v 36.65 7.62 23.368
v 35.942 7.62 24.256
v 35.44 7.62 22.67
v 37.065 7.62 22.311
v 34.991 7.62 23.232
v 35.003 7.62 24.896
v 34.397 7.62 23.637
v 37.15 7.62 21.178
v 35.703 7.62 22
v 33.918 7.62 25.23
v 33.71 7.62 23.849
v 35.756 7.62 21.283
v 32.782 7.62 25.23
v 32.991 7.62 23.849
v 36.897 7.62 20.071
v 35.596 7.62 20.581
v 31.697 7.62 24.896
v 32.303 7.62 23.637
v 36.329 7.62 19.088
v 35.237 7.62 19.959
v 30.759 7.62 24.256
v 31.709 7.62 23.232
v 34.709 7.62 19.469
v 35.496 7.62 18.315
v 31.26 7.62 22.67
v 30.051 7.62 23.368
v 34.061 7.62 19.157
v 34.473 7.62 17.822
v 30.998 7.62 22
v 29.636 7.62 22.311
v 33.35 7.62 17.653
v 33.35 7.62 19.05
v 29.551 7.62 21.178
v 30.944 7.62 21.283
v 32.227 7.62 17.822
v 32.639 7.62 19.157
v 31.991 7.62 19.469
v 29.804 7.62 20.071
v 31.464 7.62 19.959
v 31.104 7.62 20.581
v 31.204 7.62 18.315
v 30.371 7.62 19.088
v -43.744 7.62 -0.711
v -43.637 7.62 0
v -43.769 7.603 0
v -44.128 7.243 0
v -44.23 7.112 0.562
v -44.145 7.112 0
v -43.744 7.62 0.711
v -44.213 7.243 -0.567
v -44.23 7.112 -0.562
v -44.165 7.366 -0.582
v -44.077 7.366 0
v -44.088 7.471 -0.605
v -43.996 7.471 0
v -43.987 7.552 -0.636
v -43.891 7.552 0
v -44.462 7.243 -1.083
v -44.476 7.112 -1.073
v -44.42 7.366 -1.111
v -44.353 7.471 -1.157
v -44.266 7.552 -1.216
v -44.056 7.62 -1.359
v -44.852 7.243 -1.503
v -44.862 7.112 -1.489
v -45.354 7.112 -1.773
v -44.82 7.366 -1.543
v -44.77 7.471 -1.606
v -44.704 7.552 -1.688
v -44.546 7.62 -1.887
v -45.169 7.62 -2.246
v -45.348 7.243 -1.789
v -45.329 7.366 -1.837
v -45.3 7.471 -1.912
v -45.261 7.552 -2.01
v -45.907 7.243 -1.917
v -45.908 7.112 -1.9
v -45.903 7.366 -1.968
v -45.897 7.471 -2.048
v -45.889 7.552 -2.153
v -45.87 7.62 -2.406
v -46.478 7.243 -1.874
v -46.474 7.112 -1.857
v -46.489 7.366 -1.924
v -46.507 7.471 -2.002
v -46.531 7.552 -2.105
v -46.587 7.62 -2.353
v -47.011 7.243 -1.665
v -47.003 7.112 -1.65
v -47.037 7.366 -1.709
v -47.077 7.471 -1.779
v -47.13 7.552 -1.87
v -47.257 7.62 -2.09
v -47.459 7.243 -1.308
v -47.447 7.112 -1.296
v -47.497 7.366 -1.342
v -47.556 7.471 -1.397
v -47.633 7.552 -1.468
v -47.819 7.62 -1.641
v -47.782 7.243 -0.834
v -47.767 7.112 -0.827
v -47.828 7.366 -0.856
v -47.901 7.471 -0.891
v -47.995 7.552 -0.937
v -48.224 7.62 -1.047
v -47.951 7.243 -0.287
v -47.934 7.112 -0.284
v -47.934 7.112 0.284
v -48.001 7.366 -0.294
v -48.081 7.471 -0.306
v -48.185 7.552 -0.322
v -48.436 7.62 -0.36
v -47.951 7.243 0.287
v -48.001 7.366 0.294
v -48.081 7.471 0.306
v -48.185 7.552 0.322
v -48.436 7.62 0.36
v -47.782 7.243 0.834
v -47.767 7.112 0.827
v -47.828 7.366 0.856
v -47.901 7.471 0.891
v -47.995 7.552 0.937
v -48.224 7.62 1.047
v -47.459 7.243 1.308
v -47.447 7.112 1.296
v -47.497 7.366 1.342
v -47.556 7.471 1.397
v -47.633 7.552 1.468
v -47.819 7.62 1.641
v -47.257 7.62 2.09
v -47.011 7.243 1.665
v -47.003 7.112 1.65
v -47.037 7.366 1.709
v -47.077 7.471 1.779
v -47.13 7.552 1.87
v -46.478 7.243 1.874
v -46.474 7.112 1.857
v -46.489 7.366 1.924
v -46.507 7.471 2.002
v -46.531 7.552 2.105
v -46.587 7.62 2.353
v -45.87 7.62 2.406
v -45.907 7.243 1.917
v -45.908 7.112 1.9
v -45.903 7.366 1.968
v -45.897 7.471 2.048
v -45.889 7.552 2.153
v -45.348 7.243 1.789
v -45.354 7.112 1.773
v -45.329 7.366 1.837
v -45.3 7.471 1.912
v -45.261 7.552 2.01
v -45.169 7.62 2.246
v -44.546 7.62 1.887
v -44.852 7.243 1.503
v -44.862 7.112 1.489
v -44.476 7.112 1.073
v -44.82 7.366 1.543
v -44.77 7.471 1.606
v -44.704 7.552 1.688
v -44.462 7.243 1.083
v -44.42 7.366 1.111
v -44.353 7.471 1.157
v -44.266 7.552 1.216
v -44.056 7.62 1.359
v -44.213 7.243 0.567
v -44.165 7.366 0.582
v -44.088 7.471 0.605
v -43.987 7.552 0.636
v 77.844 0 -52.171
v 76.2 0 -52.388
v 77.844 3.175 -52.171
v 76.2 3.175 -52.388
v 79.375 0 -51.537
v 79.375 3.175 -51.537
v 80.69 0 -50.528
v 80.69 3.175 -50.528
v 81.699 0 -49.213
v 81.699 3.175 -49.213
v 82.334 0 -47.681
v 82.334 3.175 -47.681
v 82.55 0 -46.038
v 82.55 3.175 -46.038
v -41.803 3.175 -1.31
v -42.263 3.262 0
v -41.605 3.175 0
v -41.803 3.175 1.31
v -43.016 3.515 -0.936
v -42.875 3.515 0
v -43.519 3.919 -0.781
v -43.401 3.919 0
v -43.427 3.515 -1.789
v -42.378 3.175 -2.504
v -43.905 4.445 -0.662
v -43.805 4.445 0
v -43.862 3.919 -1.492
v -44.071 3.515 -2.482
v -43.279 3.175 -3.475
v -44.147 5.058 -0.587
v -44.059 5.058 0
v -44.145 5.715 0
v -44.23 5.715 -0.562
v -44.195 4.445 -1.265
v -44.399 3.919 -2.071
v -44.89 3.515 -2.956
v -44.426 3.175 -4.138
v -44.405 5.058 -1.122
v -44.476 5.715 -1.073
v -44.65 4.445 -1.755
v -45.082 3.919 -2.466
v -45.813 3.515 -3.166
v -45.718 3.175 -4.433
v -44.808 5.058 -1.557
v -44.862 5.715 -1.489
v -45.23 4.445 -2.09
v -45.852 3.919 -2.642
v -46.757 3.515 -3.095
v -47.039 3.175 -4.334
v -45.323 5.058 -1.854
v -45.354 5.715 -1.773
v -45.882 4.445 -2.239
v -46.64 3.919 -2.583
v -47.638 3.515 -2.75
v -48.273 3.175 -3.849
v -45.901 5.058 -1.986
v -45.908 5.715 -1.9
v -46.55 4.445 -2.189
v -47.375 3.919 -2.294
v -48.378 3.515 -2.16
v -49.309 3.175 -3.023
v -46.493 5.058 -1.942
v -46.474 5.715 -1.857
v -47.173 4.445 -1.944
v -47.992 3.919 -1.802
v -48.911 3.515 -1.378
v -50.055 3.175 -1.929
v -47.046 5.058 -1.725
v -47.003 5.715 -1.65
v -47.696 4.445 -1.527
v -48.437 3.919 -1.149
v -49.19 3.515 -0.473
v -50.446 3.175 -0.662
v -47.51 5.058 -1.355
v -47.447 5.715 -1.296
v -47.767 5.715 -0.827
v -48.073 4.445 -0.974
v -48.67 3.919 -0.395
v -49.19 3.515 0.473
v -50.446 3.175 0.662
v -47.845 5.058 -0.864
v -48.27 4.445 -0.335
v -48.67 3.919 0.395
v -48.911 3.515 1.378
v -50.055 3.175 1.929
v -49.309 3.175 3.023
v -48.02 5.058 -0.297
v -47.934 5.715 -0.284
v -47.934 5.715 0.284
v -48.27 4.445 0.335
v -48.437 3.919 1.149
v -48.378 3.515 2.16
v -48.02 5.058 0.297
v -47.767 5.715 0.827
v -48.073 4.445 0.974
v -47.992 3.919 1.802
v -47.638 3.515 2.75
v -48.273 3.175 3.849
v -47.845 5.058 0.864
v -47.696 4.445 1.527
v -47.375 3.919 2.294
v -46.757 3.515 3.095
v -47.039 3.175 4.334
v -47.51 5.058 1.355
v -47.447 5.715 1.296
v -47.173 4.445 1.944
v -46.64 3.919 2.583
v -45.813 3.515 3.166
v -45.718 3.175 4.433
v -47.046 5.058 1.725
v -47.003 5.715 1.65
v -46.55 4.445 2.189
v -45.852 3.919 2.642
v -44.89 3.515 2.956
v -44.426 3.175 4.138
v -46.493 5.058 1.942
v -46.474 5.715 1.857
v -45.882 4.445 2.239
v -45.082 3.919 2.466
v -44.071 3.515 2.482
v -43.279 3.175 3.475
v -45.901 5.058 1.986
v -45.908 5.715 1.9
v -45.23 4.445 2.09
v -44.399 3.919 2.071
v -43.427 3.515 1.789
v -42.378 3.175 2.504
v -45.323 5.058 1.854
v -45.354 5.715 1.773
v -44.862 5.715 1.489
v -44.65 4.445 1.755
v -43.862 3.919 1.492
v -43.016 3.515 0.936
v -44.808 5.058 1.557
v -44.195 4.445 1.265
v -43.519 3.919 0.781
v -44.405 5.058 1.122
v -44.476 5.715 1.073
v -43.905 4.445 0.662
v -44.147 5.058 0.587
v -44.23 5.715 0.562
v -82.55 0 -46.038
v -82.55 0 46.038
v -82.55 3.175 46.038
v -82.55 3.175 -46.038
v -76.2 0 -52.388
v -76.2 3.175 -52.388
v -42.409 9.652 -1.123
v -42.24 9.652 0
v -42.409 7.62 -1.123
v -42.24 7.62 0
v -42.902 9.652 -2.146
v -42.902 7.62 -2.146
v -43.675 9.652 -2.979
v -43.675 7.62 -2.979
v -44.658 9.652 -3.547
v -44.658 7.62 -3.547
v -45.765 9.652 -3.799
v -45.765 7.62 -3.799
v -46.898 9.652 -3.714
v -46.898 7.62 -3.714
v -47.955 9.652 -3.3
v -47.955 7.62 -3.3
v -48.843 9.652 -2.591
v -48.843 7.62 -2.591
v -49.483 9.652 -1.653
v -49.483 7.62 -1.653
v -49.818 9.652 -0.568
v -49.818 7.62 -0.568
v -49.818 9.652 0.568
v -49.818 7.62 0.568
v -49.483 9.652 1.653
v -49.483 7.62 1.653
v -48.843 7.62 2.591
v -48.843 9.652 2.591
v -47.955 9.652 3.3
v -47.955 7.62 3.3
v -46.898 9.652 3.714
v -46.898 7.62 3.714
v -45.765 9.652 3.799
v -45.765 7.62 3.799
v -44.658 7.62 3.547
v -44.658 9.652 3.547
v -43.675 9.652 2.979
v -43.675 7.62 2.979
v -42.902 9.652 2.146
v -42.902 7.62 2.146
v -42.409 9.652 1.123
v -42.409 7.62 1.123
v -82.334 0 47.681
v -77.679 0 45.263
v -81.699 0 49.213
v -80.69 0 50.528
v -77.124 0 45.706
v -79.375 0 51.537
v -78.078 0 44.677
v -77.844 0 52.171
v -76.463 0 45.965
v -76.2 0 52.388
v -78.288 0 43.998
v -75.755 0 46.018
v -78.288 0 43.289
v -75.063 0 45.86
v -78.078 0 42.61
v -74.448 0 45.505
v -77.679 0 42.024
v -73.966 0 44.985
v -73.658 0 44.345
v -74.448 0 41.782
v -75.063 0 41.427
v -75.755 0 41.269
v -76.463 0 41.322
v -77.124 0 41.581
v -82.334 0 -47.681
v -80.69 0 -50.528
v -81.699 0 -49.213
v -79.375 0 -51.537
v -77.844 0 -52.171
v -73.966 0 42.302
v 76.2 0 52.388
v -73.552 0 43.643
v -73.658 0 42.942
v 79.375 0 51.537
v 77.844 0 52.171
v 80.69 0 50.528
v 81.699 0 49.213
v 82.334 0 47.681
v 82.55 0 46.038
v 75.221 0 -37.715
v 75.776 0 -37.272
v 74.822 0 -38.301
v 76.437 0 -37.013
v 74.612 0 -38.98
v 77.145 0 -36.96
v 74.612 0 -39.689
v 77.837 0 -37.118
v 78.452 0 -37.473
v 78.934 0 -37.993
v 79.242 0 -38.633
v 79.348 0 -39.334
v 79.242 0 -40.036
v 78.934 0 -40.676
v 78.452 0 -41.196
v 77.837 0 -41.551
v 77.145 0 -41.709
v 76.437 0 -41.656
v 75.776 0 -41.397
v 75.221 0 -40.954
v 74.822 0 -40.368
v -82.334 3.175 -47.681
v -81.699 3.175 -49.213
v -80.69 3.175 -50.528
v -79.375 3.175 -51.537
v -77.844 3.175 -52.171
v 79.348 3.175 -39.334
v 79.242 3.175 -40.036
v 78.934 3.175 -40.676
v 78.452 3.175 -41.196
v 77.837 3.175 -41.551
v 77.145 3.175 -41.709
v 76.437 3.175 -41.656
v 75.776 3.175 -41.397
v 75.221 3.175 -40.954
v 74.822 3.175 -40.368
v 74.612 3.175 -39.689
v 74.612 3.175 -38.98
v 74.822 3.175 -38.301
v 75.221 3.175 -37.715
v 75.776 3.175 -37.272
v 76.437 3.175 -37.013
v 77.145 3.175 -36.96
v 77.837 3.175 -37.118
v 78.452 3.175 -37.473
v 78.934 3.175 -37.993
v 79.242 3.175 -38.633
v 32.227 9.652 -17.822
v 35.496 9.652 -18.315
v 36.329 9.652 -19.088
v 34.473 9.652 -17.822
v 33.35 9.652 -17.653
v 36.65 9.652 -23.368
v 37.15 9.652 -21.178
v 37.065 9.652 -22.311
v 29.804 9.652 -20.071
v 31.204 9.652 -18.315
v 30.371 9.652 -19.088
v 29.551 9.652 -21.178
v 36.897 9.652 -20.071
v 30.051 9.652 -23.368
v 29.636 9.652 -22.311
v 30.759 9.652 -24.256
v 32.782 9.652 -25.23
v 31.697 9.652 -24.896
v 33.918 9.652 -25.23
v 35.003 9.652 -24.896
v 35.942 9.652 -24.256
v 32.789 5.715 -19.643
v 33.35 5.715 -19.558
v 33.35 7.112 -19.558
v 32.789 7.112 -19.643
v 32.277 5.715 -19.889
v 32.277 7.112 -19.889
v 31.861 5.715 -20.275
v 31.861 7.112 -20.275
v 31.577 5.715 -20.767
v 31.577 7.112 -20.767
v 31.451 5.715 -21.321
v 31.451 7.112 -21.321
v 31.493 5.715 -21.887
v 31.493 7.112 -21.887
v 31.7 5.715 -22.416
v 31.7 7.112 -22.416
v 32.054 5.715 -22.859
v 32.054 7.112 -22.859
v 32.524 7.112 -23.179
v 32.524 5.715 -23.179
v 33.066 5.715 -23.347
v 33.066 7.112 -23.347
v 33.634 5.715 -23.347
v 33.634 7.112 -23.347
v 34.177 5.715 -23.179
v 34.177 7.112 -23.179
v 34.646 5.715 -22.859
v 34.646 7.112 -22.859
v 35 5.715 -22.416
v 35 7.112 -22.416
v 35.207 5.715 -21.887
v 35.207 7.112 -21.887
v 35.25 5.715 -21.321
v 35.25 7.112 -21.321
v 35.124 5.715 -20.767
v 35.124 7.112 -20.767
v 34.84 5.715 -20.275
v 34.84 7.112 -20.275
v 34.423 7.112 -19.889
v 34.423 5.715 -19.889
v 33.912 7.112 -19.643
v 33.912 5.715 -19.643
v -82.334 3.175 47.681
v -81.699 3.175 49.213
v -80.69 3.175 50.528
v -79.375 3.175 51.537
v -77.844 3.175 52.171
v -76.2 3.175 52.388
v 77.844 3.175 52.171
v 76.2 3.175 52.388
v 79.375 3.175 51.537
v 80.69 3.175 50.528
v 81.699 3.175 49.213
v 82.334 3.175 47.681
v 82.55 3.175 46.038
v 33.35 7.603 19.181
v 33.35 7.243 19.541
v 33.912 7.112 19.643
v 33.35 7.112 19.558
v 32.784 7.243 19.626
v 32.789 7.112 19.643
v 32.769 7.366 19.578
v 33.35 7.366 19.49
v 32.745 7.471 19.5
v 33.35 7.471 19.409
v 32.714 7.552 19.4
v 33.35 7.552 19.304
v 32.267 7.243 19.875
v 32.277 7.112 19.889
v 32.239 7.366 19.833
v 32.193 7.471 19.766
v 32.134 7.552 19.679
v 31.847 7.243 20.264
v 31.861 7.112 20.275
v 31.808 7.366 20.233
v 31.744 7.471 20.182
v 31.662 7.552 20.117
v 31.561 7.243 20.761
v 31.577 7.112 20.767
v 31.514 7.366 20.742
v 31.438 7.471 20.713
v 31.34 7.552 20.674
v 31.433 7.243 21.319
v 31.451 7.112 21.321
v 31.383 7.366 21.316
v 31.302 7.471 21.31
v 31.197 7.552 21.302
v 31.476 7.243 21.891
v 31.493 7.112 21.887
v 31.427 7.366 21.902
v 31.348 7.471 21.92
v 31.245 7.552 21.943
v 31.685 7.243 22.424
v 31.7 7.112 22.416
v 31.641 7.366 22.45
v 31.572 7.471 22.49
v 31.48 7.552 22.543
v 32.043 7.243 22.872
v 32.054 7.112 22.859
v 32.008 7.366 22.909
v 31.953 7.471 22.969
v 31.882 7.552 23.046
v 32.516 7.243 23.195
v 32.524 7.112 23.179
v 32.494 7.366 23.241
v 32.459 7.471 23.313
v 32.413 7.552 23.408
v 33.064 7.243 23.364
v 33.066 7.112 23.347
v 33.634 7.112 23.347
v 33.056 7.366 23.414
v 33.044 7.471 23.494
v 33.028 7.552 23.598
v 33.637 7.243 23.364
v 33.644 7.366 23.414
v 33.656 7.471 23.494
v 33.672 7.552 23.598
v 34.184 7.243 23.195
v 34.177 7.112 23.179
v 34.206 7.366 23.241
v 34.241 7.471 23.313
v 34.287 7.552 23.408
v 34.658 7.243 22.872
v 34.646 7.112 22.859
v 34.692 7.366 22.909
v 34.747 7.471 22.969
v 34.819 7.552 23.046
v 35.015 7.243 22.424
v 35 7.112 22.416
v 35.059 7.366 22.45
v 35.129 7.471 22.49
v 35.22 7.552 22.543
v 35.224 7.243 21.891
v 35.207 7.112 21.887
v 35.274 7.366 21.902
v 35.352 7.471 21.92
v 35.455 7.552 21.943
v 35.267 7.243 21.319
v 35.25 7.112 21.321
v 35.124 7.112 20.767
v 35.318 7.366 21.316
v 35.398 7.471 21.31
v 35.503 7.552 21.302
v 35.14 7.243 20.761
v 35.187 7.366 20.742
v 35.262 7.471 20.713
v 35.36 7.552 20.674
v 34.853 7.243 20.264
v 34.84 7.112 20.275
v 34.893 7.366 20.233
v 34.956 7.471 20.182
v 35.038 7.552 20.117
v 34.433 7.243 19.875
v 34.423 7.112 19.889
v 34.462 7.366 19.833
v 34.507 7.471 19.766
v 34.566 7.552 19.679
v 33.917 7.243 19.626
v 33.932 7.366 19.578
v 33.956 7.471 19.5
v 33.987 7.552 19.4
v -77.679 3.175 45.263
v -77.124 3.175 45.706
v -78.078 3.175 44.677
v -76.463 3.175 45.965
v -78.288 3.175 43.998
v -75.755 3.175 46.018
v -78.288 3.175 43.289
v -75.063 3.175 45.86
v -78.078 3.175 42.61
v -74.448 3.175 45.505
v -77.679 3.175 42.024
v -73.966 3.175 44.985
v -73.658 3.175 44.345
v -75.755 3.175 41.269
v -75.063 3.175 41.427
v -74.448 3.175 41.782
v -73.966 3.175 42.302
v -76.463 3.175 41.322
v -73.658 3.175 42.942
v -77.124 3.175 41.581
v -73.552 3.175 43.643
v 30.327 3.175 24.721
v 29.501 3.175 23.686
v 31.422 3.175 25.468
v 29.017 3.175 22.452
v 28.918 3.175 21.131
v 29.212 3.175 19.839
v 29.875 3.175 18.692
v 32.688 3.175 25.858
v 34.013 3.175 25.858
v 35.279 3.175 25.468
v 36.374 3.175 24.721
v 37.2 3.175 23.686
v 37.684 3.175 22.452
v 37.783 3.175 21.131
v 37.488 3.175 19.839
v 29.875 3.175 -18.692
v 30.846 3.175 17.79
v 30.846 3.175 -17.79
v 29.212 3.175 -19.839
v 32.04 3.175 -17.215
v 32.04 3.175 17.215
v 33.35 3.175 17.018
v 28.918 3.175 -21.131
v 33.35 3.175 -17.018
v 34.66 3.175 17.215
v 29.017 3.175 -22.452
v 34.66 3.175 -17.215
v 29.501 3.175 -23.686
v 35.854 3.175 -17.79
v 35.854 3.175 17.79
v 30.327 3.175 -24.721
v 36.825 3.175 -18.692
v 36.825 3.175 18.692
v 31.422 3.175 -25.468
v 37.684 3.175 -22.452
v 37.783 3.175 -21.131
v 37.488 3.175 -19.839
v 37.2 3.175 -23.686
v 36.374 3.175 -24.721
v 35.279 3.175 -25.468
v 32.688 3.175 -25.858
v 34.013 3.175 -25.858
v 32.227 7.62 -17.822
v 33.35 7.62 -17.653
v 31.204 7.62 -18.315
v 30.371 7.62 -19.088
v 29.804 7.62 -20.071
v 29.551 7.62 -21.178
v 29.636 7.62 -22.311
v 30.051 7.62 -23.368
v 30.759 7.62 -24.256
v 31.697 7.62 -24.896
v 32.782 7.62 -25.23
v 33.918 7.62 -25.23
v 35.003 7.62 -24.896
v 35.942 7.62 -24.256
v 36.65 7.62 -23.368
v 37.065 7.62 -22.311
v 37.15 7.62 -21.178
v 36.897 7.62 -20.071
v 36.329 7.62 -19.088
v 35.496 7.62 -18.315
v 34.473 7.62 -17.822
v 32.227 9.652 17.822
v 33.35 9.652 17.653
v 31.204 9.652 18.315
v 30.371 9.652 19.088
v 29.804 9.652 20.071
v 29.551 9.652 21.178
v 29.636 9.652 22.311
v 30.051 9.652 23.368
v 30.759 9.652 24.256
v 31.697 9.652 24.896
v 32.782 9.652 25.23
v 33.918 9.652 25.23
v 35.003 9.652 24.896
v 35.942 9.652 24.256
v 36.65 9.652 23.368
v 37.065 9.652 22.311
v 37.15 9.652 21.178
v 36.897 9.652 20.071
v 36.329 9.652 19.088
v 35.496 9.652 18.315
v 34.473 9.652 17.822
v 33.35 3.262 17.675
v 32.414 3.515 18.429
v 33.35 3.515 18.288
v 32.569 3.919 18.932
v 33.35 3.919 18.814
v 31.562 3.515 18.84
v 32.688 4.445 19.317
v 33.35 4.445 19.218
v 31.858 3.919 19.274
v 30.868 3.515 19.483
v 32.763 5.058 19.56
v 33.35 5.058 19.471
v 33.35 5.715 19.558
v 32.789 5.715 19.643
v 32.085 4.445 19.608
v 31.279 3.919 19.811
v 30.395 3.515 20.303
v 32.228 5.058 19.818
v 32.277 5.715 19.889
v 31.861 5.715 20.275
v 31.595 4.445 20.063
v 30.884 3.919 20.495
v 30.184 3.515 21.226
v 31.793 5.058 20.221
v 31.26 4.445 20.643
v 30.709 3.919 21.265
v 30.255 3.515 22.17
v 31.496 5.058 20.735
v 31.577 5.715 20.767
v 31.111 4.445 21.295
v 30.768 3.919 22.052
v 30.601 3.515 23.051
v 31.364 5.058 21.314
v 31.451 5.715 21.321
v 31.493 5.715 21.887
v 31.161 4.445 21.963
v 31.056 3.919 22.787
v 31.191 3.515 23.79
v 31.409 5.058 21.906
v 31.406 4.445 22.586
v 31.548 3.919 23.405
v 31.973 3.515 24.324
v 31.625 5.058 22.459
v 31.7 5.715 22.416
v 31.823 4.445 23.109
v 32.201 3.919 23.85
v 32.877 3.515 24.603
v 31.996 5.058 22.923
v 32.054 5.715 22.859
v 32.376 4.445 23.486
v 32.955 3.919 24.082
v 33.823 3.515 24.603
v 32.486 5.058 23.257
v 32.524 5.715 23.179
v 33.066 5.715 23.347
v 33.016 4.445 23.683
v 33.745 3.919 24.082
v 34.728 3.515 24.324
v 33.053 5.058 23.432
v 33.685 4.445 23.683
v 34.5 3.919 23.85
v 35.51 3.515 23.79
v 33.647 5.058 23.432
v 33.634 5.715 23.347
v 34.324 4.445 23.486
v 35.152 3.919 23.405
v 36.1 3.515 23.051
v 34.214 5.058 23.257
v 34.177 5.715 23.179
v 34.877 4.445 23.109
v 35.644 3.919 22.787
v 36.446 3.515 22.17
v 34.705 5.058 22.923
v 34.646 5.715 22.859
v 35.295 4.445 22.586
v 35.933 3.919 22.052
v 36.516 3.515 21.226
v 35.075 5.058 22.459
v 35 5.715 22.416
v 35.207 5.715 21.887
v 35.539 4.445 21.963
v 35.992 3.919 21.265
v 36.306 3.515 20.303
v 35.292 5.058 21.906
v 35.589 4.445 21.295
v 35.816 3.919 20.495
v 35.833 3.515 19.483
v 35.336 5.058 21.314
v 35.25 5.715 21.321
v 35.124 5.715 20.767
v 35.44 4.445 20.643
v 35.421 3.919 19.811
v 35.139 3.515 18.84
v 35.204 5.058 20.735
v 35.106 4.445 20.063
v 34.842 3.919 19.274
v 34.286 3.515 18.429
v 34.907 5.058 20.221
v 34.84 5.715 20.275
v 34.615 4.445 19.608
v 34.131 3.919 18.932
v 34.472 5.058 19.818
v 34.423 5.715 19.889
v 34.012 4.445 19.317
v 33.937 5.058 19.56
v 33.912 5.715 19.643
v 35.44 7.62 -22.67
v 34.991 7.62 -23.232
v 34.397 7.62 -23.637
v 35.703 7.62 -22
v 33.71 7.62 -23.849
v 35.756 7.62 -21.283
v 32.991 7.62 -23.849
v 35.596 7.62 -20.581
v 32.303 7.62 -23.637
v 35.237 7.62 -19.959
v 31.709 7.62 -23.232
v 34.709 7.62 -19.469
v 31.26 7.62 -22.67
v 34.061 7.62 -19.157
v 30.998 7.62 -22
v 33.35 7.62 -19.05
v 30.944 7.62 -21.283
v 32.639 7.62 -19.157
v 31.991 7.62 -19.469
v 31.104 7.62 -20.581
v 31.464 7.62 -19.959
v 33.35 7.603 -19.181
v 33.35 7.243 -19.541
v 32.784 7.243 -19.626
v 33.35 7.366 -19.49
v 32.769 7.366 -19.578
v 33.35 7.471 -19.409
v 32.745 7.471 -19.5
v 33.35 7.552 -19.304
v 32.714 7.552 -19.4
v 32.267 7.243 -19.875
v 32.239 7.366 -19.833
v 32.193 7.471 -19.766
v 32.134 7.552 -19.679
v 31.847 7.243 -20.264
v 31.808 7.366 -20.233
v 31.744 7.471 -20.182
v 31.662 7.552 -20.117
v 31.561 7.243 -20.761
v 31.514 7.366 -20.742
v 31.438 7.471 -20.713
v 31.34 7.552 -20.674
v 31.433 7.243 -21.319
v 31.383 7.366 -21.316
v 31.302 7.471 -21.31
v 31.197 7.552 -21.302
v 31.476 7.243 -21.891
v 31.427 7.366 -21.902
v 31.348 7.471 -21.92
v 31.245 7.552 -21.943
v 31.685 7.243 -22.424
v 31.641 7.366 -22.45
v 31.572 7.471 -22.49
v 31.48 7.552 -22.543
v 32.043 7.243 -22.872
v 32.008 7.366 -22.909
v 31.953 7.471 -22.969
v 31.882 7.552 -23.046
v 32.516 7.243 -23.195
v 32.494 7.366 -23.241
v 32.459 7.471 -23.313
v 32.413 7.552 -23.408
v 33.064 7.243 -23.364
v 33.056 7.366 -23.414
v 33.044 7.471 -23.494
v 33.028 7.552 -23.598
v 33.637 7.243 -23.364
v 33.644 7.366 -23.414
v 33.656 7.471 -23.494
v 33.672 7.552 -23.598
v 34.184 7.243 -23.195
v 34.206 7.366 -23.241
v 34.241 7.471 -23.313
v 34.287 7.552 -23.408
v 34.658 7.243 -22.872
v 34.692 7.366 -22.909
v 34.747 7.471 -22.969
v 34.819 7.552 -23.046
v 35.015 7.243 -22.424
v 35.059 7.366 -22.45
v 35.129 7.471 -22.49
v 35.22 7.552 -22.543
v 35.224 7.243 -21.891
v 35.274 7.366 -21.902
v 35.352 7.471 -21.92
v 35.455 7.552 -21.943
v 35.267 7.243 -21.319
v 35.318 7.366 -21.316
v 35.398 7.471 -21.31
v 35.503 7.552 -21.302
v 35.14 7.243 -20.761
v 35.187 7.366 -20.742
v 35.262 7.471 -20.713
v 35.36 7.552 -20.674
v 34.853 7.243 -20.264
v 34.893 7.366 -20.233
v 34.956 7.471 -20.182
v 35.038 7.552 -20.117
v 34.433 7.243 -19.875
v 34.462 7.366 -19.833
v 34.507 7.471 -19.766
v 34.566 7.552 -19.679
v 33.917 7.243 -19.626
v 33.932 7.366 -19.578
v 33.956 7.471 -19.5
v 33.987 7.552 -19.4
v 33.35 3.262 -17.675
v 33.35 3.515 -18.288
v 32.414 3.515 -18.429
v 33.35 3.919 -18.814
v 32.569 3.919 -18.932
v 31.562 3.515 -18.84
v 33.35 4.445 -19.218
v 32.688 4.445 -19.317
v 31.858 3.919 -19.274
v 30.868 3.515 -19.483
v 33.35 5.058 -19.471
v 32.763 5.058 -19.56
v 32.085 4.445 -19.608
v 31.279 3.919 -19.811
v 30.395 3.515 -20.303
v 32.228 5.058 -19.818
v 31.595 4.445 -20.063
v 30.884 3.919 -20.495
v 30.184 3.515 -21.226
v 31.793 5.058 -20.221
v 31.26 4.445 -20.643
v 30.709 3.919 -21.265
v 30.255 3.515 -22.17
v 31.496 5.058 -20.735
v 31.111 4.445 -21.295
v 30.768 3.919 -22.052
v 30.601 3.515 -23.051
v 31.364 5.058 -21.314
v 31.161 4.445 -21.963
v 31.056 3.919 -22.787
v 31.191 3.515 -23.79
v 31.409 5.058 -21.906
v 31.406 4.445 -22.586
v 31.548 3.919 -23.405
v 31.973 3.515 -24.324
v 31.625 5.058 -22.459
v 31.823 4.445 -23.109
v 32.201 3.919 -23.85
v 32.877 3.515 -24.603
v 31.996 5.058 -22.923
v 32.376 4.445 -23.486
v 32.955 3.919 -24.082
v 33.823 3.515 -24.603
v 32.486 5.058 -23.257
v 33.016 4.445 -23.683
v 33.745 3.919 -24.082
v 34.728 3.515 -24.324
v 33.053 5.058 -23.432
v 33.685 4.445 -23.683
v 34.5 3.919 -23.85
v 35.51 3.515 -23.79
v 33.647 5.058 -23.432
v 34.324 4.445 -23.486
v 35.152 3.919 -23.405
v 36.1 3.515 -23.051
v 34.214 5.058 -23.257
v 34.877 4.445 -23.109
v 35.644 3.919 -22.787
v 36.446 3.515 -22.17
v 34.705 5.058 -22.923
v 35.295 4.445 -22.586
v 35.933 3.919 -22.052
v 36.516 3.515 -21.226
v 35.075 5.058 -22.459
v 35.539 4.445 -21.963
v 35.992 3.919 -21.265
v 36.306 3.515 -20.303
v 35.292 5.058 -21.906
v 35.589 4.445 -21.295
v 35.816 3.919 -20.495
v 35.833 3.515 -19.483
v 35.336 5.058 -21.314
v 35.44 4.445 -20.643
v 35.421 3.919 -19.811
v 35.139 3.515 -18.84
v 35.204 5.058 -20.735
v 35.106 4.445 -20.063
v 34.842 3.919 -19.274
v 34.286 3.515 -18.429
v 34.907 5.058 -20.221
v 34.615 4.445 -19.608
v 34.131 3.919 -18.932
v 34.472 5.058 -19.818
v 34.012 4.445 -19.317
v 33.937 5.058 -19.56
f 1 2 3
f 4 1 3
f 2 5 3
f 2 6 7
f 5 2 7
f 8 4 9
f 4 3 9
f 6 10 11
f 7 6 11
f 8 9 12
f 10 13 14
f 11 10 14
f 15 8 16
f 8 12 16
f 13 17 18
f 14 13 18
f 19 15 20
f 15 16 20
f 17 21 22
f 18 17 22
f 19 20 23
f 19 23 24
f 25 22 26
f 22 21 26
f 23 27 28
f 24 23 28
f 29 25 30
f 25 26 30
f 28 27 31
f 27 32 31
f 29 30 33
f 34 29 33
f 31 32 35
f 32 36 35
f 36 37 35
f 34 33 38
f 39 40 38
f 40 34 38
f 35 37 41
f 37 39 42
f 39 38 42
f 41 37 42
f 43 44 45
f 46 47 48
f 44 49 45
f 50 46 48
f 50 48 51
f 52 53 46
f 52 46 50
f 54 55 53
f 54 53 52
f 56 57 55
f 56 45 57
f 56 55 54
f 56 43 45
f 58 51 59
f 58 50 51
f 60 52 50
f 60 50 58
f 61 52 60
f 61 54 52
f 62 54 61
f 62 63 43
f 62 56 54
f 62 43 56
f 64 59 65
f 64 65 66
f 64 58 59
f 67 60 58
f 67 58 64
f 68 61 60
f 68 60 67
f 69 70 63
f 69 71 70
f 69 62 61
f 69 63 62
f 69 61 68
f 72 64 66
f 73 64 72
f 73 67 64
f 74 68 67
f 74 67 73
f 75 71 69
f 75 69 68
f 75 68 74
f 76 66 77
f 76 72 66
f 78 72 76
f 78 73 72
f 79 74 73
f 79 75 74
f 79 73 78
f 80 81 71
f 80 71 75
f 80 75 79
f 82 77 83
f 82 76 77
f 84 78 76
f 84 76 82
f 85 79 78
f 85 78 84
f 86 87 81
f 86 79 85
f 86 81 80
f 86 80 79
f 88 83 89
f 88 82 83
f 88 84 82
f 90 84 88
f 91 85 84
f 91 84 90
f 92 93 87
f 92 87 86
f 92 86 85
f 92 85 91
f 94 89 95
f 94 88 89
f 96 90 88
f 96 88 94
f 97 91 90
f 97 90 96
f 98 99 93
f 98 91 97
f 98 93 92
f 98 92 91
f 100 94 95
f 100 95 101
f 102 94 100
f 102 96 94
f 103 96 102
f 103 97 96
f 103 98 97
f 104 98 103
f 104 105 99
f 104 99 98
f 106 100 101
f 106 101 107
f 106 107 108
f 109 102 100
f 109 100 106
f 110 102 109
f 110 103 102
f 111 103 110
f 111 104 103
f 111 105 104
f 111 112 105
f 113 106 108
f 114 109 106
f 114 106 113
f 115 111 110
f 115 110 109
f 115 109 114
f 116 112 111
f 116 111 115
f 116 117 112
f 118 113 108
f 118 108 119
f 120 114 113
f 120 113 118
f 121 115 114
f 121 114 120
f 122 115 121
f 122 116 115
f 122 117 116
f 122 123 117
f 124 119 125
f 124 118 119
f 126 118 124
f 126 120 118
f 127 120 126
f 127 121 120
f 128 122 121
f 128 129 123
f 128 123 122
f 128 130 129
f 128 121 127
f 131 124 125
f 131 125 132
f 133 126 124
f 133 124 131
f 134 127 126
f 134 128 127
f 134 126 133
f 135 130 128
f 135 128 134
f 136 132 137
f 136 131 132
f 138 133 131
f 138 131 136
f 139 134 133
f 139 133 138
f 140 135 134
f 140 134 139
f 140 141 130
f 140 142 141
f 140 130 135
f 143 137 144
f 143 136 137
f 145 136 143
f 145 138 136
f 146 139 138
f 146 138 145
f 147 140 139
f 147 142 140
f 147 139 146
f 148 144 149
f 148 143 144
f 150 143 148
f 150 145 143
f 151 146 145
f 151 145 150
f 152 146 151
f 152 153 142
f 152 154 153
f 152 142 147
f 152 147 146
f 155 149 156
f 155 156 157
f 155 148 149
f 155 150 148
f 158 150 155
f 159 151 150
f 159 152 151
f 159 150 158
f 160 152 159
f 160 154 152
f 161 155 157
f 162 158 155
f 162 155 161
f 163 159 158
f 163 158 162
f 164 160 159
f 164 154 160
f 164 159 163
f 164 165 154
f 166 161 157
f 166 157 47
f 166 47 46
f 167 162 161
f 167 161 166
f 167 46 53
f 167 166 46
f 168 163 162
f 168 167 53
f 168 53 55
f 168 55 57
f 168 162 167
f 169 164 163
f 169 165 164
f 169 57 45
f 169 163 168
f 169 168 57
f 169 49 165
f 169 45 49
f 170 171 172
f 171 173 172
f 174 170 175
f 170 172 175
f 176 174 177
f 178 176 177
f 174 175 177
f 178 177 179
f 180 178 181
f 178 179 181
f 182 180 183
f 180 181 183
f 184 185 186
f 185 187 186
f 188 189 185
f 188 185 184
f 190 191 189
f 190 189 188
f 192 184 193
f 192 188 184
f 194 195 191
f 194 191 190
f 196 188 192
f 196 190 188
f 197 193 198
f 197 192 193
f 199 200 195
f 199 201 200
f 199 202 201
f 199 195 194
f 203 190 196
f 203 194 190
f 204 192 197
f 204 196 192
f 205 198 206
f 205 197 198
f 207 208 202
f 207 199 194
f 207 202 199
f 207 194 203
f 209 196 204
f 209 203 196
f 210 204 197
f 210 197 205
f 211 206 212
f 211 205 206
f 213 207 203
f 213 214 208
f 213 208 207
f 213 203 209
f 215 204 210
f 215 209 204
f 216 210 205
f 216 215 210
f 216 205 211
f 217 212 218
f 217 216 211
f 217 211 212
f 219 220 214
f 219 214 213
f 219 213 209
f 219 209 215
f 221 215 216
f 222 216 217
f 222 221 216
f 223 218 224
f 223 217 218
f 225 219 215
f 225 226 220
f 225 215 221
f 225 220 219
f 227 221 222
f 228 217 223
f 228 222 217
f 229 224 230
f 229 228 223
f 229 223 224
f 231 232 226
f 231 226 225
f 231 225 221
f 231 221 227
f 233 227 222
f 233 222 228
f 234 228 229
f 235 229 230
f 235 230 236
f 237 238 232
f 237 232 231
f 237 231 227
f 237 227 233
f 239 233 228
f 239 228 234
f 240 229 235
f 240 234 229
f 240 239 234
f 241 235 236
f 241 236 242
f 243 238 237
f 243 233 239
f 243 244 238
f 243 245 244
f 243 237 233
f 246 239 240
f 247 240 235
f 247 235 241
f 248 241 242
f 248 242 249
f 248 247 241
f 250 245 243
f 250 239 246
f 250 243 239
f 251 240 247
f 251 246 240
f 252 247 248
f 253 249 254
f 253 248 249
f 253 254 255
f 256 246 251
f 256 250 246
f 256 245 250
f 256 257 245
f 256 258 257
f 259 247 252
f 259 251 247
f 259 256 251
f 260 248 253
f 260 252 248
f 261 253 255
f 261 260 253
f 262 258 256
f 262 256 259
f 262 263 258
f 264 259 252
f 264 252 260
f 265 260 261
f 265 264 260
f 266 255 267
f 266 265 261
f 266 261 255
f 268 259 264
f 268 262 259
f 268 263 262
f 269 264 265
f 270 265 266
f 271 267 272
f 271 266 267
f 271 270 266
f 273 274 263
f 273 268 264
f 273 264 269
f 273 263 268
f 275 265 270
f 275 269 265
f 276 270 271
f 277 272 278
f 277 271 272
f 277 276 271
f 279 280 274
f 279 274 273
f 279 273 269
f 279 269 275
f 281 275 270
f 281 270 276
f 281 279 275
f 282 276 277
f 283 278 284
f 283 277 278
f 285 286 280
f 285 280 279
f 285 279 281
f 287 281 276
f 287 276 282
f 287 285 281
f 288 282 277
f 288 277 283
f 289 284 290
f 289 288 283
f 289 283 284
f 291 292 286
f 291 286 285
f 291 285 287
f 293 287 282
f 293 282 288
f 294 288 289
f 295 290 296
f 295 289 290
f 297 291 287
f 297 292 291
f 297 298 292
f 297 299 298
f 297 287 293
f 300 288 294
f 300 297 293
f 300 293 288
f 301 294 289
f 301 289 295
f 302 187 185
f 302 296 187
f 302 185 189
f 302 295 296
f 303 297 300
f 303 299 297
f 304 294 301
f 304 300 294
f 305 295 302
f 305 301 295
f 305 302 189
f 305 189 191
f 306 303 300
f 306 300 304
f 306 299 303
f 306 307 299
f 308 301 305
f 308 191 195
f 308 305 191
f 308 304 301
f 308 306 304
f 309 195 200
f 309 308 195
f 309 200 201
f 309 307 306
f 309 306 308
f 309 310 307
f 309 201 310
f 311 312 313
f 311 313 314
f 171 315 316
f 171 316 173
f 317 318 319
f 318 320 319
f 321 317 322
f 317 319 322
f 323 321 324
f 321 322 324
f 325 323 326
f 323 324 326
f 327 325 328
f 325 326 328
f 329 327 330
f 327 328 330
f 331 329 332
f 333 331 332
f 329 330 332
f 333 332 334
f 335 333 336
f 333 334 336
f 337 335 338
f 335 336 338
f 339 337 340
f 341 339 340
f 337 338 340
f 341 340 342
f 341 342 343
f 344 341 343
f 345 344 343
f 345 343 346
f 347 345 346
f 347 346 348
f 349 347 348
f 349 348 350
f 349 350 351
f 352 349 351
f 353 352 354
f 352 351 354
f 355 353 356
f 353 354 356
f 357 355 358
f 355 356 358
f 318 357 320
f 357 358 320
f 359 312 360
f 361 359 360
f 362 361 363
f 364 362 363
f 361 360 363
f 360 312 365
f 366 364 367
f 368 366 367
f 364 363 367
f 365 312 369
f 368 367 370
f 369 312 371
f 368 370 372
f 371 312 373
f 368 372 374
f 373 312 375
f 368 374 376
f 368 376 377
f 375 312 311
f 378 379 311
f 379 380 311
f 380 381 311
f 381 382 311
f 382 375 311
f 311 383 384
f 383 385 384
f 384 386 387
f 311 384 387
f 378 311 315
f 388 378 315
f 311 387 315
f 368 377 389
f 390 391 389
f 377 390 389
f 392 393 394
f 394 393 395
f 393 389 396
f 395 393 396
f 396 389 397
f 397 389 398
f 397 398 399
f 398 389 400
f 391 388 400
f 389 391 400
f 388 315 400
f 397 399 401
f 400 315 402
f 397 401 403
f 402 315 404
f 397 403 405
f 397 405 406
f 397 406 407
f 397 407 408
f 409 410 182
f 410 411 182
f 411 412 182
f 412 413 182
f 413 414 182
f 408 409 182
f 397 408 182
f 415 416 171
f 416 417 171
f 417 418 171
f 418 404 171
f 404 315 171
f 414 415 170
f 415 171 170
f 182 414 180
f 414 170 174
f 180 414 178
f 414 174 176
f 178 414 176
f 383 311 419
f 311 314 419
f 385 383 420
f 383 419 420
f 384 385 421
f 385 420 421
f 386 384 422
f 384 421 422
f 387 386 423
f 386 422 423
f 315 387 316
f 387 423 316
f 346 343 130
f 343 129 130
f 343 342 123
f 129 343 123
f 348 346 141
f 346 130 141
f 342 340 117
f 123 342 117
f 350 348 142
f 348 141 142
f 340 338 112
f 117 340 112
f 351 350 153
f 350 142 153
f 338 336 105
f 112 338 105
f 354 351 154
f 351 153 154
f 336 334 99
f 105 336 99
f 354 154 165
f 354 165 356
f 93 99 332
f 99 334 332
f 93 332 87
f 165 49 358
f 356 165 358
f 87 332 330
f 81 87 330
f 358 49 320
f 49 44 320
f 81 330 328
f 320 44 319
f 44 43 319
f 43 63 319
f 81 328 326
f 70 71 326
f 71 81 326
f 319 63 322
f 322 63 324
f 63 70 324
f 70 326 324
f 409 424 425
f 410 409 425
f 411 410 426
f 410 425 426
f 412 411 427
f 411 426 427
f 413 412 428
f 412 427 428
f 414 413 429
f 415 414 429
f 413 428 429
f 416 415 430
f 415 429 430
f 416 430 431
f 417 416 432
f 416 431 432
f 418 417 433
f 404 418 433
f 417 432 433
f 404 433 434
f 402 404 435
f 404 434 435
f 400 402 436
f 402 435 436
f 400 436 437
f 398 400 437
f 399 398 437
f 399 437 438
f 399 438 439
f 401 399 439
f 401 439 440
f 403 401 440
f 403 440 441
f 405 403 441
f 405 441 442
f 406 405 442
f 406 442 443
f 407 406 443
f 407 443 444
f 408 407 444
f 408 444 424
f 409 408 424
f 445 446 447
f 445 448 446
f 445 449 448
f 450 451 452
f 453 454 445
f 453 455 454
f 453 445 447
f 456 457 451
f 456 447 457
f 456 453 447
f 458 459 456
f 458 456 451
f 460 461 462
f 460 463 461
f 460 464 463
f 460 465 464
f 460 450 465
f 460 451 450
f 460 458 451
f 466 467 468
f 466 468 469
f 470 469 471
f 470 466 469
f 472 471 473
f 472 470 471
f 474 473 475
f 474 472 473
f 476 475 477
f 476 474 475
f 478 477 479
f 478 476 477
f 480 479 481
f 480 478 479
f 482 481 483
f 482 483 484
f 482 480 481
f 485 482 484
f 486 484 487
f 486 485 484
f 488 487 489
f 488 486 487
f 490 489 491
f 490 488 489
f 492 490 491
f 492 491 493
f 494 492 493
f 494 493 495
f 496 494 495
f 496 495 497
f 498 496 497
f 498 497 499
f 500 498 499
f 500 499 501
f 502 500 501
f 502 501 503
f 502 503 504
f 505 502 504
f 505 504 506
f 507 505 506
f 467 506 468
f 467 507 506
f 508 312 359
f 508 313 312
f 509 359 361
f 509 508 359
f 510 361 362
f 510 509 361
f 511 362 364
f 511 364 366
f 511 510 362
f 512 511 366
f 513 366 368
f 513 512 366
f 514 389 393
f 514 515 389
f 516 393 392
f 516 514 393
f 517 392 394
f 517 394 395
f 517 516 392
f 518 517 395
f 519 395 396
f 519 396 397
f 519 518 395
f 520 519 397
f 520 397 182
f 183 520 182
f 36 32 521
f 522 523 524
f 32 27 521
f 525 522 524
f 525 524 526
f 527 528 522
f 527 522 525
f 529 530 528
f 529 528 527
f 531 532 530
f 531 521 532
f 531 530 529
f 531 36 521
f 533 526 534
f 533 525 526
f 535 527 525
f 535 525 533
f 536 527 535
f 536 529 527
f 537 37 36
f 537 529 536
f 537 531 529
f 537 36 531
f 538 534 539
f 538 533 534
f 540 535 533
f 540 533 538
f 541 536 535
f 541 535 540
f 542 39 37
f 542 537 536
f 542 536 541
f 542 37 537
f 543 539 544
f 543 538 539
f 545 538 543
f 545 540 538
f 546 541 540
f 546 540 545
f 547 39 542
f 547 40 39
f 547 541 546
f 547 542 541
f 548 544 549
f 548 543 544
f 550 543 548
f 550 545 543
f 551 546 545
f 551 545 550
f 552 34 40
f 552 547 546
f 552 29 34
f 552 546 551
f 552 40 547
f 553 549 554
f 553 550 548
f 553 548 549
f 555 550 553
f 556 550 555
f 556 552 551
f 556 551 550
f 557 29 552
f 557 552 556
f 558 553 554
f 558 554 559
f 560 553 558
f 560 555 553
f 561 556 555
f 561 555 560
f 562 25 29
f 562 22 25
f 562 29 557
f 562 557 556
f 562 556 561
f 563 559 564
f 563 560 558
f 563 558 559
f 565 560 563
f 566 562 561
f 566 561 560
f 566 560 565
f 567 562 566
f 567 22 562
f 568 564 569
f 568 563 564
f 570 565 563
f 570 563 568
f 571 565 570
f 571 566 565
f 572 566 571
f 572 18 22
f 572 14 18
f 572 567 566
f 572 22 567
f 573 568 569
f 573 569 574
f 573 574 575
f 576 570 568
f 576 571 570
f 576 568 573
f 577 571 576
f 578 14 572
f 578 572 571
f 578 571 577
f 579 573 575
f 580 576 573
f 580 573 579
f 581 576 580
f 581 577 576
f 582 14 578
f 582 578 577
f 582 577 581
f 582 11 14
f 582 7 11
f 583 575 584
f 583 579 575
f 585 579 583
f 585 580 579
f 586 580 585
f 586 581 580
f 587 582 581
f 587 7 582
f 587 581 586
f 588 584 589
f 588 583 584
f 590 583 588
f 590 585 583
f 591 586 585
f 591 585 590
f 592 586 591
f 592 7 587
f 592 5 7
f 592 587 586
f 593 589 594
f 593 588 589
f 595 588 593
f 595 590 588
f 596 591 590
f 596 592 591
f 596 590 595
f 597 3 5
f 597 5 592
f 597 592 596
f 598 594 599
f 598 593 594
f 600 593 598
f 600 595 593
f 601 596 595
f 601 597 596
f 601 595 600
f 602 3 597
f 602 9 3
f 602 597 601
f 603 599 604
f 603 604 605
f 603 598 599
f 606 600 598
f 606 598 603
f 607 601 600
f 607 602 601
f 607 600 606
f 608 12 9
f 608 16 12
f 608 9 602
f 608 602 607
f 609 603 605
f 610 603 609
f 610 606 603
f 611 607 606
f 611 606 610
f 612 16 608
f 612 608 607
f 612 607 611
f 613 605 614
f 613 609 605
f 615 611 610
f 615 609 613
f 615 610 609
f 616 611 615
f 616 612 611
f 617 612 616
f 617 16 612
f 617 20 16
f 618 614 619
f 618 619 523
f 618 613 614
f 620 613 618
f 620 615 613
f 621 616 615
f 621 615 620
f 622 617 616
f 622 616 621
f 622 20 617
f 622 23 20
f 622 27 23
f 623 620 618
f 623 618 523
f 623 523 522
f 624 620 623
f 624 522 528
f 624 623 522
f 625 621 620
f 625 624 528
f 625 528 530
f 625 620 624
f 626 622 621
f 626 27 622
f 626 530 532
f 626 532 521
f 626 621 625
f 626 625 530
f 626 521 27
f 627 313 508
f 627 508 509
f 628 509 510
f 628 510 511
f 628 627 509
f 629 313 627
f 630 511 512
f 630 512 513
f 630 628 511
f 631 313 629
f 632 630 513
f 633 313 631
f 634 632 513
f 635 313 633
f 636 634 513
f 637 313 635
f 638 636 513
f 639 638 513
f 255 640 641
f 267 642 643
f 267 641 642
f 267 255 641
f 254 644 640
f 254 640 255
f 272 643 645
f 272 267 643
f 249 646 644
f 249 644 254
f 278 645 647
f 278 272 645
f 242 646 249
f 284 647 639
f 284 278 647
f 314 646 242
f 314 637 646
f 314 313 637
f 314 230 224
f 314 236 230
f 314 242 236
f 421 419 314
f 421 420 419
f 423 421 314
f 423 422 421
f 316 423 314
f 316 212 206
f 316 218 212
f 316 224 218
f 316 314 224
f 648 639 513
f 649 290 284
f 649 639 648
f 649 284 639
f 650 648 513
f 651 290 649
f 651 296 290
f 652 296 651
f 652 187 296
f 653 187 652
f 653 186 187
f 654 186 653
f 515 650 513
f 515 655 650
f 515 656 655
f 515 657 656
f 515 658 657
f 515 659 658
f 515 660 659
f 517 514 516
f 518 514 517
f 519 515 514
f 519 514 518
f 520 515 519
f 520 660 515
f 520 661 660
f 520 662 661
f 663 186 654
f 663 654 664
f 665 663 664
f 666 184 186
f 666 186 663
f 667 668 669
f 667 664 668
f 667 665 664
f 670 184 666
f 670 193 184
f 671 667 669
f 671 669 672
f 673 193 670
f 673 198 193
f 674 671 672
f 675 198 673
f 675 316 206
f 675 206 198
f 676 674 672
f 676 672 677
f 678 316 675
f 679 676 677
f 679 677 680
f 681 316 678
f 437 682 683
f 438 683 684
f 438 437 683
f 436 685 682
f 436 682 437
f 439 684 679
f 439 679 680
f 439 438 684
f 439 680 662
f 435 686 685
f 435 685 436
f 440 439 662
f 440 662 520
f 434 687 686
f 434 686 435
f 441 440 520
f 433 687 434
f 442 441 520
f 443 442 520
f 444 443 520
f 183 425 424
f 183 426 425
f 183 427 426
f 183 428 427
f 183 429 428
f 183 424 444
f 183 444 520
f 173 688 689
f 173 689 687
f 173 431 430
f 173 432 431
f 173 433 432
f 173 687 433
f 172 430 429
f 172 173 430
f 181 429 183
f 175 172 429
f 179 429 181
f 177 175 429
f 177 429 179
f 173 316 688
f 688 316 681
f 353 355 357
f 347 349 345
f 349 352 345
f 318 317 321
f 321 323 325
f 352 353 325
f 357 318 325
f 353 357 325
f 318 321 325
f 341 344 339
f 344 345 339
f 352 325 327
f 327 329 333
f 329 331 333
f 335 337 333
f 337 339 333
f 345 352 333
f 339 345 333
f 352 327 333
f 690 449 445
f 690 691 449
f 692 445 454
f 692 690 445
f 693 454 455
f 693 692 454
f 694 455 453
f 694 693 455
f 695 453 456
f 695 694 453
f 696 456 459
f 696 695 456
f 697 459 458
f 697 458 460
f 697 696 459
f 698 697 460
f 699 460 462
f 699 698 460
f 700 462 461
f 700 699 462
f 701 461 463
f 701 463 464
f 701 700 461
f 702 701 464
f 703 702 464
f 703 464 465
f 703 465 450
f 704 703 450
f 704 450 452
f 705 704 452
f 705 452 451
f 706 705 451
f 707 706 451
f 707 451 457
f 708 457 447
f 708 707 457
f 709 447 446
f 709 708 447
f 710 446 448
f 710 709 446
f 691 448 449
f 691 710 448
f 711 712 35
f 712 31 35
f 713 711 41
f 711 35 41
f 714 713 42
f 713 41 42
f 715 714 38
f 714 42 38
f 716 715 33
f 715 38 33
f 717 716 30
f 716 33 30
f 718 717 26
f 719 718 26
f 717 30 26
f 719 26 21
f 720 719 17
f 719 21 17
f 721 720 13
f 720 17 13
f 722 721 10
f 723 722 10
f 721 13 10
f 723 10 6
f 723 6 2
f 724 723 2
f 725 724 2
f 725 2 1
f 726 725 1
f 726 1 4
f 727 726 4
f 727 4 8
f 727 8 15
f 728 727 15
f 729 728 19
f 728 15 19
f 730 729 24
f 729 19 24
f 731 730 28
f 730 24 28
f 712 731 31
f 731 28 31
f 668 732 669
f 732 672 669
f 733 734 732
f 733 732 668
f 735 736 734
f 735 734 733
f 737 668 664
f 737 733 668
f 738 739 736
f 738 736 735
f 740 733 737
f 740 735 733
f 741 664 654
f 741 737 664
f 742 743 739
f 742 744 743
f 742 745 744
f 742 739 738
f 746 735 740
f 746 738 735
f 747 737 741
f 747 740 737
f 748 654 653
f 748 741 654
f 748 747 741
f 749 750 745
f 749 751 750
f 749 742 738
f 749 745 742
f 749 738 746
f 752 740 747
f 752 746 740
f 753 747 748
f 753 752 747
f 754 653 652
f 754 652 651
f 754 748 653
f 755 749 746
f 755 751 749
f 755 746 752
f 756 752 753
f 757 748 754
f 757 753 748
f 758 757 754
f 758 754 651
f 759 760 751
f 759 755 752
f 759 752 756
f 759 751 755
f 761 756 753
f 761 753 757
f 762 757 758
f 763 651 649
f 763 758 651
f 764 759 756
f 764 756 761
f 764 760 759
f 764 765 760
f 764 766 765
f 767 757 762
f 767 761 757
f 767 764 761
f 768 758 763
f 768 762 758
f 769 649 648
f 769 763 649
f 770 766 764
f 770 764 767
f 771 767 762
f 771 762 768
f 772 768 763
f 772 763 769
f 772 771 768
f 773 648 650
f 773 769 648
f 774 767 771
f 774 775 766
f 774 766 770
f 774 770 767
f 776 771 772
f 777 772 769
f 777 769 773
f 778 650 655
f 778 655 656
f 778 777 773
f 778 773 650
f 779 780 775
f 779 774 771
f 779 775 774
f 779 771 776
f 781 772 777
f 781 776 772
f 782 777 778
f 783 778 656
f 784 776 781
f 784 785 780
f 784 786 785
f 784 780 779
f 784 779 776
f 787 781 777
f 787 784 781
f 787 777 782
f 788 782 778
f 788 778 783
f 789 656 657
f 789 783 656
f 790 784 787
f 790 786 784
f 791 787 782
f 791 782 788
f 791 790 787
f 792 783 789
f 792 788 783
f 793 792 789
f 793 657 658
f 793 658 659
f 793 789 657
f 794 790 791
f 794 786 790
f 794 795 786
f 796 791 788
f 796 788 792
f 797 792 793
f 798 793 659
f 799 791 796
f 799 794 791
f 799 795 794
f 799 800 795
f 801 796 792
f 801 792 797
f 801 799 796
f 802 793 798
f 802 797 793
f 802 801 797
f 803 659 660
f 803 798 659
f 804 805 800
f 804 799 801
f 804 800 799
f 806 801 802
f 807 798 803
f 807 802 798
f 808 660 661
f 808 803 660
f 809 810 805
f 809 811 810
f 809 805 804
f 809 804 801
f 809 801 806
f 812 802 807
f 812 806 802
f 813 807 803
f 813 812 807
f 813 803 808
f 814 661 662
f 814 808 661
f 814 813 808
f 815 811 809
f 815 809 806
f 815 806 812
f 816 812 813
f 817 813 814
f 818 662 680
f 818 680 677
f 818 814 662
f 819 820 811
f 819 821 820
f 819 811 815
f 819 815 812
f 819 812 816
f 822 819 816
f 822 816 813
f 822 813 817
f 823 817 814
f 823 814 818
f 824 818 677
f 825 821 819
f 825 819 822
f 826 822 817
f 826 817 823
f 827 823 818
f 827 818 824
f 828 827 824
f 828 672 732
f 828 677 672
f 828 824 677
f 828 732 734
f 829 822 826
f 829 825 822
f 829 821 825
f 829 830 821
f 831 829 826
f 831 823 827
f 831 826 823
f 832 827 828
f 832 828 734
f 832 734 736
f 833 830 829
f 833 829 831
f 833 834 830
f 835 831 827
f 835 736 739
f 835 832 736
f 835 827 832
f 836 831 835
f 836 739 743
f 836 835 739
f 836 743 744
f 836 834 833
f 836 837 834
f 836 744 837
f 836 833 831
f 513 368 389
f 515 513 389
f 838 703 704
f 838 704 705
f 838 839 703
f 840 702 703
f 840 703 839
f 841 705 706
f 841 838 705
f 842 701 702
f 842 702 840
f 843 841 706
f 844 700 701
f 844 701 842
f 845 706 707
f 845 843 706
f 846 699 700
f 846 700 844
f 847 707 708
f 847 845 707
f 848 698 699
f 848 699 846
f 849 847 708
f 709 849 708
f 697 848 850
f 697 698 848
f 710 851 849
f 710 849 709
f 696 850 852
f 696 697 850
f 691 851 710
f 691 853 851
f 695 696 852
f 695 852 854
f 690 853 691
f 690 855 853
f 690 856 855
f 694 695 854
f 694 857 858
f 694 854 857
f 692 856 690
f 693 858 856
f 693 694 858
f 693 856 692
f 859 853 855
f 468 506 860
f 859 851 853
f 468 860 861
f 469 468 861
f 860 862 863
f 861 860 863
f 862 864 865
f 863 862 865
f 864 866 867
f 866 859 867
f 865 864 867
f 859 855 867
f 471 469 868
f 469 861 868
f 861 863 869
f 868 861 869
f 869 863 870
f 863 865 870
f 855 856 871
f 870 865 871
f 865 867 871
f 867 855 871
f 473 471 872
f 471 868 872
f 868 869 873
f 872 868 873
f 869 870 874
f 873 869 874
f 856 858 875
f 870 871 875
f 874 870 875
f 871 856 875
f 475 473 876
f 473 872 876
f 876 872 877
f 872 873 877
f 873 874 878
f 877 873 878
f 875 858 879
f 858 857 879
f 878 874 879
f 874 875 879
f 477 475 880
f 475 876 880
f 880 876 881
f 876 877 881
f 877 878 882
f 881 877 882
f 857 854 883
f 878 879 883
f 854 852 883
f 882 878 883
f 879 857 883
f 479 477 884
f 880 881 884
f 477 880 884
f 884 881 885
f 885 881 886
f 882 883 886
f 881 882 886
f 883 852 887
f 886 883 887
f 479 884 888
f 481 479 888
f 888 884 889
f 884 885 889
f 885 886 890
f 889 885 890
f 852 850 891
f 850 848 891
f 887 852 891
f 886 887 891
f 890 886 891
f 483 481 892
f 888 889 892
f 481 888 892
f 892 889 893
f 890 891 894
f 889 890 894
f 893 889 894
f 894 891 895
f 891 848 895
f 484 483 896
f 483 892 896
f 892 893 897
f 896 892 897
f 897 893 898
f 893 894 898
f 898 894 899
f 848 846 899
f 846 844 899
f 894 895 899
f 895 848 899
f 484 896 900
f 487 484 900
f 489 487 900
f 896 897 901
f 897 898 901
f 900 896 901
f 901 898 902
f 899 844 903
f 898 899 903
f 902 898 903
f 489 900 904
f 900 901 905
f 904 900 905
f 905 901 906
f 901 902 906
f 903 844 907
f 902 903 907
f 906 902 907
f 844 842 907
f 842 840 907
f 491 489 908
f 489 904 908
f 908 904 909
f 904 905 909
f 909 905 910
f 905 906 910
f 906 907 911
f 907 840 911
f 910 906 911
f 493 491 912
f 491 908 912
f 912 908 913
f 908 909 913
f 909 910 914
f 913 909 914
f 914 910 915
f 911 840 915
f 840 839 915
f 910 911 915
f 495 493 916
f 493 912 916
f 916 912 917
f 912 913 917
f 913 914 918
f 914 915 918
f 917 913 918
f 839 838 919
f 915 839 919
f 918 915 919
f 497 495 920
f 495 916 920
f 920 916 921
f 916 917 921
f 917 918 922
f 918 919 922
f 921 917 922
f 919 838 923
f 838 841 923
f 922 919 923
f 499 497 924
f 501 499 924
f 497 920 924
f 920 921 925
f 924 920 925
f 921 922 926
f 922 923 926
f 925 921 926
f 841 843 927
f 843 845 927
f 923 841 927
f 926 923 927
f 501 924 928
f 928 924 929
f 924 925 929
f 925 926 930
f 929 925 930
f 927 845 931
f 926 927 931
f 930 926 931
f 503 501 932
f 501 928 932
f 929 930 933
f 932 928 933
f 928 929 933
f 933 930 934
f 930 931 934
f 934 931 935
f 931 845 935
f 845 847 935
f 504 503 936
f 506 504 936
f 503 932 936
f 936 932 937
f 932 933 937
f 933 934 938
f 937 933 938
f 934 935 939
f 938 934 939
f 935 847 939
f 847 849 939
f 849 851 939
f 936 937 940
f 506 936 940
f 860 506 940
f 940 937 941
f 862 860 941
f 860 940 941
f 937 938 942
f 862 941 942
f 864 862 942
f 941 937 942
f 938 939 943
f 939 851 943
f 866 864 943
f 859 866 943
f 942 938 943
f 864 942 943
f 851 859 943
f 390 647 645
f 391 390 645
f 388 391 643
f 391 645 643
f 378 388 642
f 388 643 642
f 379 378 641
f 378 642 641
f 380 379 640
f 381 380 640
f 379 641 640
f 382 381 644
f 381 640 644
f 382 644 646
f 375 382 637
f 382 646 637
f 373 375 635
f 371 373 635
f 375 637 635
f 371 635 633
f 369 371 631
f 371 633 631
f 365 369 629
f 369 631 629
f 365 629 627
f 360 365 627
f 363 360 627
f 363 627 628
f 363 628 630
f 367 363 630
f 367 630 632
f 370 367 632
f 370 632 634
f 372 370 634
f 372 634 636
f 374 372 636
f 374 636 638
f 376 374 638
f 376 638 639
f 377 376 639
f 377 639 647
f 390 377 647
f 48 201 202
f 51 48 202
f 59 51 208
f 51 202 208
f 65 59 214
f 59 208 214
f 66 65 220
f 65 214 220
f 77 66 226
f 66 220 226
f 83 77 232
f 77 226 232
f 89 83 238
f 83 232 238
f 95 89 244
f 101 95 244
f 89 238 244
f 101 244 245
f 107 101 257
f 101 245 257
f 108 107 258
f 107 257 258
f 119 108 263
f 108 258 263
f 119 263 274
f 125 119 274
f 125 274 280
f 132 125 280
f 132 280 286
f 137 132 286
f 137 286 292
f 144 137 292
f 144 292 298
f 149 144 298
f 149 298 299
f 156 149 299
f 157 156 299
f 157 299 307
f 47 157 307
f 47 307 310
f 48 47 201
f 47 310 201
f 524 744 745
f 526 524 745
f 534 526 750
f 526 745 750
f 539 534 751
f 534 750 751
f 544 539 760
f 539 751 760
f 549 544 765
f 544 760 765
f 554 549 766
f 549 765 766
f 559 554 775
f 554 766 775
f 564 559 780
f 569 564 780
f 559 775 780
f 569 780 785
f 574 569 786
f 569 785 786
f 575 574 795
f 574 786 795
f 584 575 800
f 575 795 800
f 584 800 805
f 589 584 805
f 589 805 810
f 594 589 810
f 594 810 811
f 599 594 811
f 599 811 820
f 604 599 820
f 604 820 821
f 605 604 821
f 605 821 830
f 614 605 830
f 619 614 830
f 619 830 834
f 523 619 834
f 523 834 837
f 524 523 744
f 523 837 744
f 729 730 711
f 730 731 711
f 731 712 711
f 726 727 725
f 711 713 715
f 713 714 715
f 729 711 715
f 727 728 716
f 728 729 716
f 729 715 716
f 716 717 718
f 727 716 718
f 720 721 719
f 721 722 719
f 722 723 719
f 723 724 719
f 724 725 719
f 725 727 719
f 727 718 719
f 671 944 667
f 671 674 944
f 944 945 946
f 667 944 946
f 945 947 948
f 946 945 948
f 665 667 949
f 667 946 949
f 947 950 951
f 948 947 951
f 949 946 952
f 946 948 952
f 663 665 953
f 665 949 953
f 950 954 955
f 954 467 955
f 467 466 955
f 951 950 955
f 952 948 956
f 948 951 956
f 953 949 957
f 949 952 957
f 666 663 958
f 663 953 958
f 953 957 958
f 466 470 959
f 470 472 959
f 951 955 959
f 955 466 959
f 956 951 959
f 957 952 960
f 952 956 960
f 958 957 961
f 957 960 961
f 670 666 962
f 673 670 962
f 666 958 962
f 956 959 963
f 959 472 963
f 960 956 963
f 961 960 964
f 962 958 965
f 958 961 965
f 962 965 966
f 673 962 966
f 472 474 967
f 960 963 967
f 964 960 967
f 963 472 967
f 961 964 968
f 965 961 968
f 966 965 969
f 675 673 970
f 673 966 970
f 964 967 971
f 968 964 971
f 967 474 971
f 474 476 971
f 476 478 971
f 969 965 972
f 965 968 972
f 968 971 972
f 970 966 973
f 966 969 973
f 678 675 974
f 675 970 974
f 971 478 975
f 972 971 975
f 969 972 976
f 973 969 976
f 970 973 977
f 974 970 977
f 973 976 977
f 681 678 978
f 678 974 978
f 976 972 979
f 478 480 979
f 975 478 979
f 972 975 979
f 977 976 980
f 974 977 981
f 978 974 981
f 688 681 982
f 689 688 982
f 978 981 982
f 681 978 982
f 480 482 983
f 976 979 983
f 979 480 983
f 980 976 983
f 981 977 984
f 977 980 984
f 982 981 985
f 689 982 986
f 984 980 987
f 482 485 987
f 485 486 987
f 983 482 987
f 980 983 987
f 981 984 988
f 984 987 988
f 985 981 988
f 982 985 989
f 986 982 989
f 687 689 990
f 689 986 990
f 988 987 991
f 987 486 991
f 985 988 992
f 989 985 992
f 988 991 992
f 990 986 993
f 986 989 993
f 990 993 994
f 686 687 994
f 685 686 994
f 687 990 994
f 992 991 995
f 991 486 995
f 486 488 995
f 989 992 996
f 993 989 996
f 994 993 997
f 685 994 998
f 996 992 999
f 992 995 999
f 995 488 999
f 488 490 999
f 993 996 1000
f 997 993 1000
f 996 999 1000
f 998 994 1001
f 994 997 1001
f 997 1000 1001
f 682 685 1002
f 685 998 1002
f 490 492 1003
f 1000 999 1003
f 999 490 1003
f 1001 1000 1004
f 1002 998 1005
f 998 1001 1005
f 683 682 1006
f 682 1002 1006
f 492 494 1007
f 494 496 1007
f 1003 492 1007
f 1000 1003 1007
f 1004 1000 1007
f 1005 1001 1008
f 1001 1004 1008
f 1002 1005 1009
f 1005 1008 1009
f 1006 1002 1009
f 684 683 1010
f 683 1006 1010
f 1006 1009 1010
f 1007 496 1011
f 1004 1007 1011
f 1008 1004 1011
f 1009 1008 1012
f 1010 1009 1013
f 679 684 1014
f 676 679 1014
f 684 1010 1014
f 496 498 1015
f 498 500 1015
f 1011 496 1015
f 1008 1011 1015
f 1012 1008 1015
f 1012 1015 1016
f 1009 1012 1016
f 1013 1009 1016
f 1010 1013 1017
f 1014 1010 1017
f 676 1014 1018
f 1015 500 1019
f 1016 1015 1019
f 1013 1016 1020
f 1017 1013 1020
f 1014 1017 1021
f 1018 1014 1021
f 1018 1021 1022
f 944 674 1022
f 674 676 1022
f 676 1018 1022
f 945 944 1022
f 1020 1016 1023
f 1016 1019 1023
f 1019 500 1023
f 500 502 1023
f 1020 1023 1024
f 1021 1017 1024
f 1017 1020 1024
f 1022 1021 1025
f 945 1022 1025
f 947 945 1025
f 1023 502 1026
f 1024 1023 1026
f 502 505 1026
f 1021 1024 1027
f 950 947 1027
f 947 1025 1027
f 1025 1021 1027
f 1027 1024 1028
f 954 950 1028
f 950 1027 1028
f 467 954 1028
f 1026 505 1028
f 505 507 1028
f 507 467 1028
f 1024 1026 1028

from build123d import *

# Parameters (mm, degrees)
SKETCH1_W           = 165.1
SKETCH1_H           = 104.775
BOSS_EXTRUDE1_DEPTH = 3.175
FILLET1_R           = 2.54
FILLET2_R           = 0.508
FILLET3_R           = 6.35
SKETCH4_R           = 2.38125
CUT_EXTRUDE1_DEPTH  = 4.175


with BuildPart() as part:
    # Sketch1 → Boss-Extrude1 (new body)
    with BuildSketch(Plane(origin=(0, 0, 0), x_dir=(1, 0, 0), z_dir=(0, 1, 0))):
        Rectangle(SKETCH1_W, SKETCH1_H)
    extrude(amount=BOSS_EXTRUDE1_DEPTH)

    # Sketch2 → Revolve1 (revolve)
    with BuildSketch(Plane.XY):
        Polygon((-46.0502, 3.175), (-46.0502, 9.652), (-42.2402, 9.652), (-42.2402, 7.62), (-44.1452, 7.62), (-44.1452, 3.175), align=None)
    revolve(axis=Axis((-46.0502, 3.175, 0), (0, 1, 0)))

    # Sketch3 → Revolve2 (revolve)
    with BuildSketch(Plane(origin=(33.3502, 0, 0), x_dir=(0, 0, -1), z_dir=(1, 0, 0))):
        Polygon((-21.463, 3.175), (-21.463, 9.652), (-17.653, 9.652), (-17.653, 7.62), (-19.558, 7.62), (-19.558, 3.175), align=None)
    revolve2 = revolve(axis=Axis((33.3502, 3.175, 21.463), (0, 1, 0)))

    # Mirror1: Revolve2 across plane
    add(revolve2.mirror(Plane.XY))

    # Fillet1
    fillet1_edges = [part.edges().sort_by_distance(p)[0] for p in [
        (-47.9552, 3.175, 0),
        (33.3502, 3.175, 23.368),
        (33.3502, 3.175, -23.368),
    ]]
    fillet(fillet1_edges, radius=FILLET1_R)

    # Fillet2
    fillet2_edges = [part.edges().sort_by_distance(p)[0] for p in [
        (-47.9552, 7.62, 0),
        (33.3502, 7.62, 23.368),
        (33.3502, 7.62, -23.368),
    ]]
    fillet(fillet2_edges, radius=FILLET2_R)

    # Fillet3
    fillet3_edges = [part.edges().sort_by_distance(p)[0] for p in [
        (82.55, 1.5875, 52.3875),
        (-82.55, 1.5875, 52.3875),
        (-82.55, 1.5875, -52.3875),
        (82.55, 1.5875, -52.3875),
    ]]
    fillet(fillet3_edges, radius=FILLET3_R)

    # Sketch4 → Cut-Extrude1 (cut, through all)
    with BuildSketch(Plane(origin=(0, 3.175, 0), x_dir=(1, 0, 0), z_dir=(0, 1, 0))):
        with Locations((-75.9329952, -43.643499962)):
            Circle(SKETCH4_R)
        with Locations((76.96699999, 39.3344908)):
            Circle(SKETCH4_R)
    extrude(amount=-CUT_EXTRUDE1_DEPTH, mode=Mode.SUBTRACT)


solid = part.part
